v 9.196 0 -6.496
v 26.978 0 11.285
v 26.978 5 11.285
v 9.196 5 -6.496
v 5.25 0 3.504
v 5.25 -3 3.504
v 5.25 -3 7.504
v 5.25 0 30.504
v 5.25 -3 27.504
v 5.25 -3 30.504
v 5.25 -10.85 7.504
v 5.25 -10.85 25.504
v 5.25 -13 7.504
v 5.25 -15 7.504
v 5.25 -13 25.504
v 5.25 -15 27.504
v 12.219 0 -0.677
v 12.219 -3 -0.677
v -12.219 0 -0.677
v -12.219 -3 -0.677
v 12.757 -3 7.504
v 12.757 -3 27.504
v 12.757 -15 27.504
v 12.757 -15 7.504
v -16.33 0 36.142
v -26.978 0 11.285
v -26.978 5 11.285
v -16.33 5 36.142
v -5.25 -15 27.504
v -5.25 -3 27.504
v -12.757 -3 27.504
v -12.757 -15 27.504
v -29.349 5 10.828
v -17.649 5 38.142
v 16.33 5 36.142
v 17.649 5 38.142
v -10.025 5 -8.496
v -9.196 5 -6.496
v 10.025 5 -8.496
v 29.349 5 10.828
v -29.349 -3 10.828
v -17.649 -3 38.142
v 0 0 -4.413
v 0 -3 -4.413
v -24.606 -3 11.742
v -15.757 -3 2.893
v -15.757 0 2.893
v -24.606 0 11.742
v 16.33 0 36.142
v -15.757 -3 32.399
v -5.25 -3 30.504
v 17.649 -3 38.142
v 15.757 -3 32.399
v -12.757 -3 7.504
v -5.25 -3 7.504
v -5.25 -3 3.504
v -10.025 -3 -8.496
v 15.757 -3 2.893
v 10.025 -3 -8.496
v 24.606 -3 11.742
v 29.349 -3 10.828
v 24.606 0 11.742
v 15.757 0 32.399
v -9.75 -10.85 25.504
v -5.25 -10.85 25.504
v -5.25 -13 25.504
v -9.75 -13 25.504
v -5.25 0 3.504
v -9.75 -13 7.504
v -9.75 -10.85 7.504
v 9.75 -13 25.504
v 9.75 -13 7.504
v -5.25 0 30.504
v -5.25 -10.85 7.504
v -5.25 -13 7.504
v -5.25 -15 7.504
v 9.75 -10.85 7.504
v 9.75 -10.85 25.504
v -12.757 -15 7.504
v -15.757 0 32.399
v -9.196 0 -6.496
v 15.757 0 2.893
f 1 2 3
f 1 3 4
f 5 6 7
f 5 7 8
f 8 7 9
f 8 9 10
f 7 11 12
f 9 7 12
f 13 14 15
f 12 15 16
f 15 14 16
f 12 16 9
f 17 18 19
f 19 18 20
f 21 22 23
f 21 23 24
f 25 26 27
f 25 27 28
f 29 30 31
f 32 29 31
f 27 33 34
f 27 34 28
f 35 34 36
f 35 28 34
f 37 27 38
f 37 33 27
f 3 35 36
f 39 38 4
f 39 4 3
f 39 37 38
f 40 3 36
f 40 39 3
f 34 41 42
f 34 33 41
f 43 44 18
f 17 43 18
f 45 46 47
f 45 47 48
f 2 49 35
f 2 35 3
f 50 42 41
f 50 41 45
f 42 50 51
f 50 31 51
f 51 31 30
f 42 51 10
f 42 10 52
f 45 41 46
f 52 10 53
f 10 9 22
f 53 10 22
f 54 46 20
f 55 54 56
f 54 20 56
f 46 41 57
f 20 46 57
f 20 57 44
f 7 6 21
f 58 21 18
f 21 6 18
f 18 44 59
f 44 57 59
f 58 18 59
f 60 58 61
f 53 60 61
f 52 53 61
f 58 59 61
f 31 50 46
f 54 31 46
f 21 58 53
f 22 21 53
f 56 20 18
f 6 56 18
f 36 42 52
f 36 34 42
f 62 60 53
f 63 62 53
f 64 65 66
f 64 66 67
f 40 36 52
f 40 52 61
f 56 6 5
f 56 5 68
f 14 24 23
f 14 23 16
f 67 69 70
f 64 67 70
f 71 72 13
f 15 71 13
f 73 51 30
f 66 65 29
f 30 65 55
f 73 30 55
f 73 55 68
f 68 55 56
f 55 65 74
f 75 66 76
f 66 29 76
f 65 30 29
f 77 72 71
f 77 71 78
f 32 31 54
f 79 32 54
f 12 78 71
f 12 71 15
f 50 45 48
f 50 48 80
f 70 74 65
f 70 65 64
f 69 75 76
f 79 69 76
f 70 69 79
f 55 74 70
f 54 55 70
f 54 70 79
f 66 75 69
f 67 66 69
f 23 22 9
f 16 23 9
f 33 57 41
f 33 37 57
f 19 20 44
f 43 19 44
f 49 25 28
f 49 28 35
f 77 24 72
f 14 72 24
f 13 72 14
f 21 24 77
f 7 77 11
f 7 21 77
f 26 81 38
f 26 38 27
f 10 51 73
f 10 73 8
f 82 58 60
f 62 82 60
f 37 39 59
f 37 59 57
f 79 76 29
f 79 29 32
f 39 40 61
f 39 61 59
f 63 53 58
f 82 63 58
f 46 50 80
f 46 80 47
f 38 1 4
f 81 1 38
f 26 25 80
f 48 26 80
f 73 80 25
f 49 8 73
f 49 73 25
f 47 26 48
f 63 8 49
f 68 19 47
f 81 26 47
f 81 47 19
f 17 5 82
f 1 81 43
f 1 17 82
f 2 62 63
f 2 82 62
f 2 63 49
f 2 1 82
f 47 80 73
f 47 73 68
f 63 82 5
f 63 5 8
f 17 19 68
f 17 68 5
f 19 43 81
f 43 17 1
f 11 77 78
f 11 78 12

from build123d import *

# Parameters (mm, degrees)
BOSS_EXTRUDE1_DEPTH = 5
BOSS_EXTRUDE2_DEPTH = 3
SKETCH3_W           = 7.507408842
SKETCH3_H           = 20
BOSS_EXTRUDE3_DEPTH = 12
SKETCH5_W           = 19.5
SKETCH5_H           = 2.15
CUT_EXTRUDE2_DEPTH  = 18
CUT_EXTRUDE3_DEPTH  = 50.600358979


with BuildPart() as part:
    # Sketch1 → Boss-Extrude1 (new body)
    with BuildSketch(Plane(origin=(0, 0, 0), x_dir=(1, 0, 0), z_dir=(0, 1, 0))):
        Polygon((10.024698463, 8.496116817), (-10.024698463, 8.496116817), (-29.349158436, -10.828343156), (-17.64879837, -38.142135624), (17.64879837, -38.142135624), (29.349158436, -10.828343156), align=None)
        Polygon((9.196271338, 6.496116817), (-9.196271338, 6.496116817), (-26.977652736, -11.28526458), (-16.329759674, -36.142135624), (16.329759674, -36.142135624), (26.977652736, -11.28526458), align=None, mode=Mode.SUBTRACT)
    extrude(amount=BOSS_EXTRUDE1_DEPTH)

    # Sketch2 → Boss-Extrude2 (add)
    with BuildSketch(Plane(origin=(0, 0, 0), x_dir=(-1, 0, 0), z_dir=(0, -1, 0))):
        Polygon((17.64879837, -38.142135624), (-17.64879837, -38.142135624), (-29.349158436, -10.828343156), (-10.024698463, 8.496116817), (10.024698463, 8.496116817), (29.349158436, -10.828343156), align=None)
    extrude(amount=BOSS_EXTRUDE2_DEPTH)

    # Sketch3 → Boss-Extrude3 (add)
    with BuildSketch(Plane(origin=(0, -3, 0), x_dir=(-1, 0, 0), z_dir=(0, -1, 0))):
        with Locations((9.003704421, -17.503883183)):
            Rectangle(SKETCH3_W, SKETCH3_H)
        with Locations((-9.003704421, -17.503883183)):
            Rectangle(SKETCH3_W, SKETCH3_H)
    extrude(amount=BOSS_EXTRUDE3_DEPTH)

    # Sketch5 → Cut-Extrude2 (cut)
    with BuildSketch(Plane(origin=(0, 0, 7.503883183), x_dir=(-1, 0, 0), z_dir=(0, 0, -1))):
        with Locations((0, -11.925)):
            Rectangle(SKETCH5_W, SKETCH5_H)
    extrude(amount=-CUT_EXTRUDE2_DEPTH, mode=Mode.SUBTRACT)

    # Sketch6 → Cut-Extrude3 (cut, through all)
    with BuildSketch(Plane(origin=(0, -3, 0), x_dir=(-1, 0, 0), z_dir=(0, -1, 0))):
        Polygon((5.25, -7.503883183), (5.25, -30.503883183), (-5.25, -30.503883183), (-5.25, -5.503883183), (-5.25, -3.503883183), (5.25, -3.503883183), align=None)
        Polygon((-24.606147036, -11.742186005), (-15.757408842, -32.399037357), (-15.757408842, -2.893447811), align=None)
        Polygon((-12.219190477, 0.676990597), (12.219190477, 0.676990597), (0, 4.412772028), align=None)
        Polygon((15.757408842, -2.893447811), (24.606147036, -11.742186005), (15.757408842, -32.399037357), align=None)
    extrude(amount=-CUT_EXTRUDE3_DEPTH, mode=Mode.SUBTRACT)


solid = part.part
